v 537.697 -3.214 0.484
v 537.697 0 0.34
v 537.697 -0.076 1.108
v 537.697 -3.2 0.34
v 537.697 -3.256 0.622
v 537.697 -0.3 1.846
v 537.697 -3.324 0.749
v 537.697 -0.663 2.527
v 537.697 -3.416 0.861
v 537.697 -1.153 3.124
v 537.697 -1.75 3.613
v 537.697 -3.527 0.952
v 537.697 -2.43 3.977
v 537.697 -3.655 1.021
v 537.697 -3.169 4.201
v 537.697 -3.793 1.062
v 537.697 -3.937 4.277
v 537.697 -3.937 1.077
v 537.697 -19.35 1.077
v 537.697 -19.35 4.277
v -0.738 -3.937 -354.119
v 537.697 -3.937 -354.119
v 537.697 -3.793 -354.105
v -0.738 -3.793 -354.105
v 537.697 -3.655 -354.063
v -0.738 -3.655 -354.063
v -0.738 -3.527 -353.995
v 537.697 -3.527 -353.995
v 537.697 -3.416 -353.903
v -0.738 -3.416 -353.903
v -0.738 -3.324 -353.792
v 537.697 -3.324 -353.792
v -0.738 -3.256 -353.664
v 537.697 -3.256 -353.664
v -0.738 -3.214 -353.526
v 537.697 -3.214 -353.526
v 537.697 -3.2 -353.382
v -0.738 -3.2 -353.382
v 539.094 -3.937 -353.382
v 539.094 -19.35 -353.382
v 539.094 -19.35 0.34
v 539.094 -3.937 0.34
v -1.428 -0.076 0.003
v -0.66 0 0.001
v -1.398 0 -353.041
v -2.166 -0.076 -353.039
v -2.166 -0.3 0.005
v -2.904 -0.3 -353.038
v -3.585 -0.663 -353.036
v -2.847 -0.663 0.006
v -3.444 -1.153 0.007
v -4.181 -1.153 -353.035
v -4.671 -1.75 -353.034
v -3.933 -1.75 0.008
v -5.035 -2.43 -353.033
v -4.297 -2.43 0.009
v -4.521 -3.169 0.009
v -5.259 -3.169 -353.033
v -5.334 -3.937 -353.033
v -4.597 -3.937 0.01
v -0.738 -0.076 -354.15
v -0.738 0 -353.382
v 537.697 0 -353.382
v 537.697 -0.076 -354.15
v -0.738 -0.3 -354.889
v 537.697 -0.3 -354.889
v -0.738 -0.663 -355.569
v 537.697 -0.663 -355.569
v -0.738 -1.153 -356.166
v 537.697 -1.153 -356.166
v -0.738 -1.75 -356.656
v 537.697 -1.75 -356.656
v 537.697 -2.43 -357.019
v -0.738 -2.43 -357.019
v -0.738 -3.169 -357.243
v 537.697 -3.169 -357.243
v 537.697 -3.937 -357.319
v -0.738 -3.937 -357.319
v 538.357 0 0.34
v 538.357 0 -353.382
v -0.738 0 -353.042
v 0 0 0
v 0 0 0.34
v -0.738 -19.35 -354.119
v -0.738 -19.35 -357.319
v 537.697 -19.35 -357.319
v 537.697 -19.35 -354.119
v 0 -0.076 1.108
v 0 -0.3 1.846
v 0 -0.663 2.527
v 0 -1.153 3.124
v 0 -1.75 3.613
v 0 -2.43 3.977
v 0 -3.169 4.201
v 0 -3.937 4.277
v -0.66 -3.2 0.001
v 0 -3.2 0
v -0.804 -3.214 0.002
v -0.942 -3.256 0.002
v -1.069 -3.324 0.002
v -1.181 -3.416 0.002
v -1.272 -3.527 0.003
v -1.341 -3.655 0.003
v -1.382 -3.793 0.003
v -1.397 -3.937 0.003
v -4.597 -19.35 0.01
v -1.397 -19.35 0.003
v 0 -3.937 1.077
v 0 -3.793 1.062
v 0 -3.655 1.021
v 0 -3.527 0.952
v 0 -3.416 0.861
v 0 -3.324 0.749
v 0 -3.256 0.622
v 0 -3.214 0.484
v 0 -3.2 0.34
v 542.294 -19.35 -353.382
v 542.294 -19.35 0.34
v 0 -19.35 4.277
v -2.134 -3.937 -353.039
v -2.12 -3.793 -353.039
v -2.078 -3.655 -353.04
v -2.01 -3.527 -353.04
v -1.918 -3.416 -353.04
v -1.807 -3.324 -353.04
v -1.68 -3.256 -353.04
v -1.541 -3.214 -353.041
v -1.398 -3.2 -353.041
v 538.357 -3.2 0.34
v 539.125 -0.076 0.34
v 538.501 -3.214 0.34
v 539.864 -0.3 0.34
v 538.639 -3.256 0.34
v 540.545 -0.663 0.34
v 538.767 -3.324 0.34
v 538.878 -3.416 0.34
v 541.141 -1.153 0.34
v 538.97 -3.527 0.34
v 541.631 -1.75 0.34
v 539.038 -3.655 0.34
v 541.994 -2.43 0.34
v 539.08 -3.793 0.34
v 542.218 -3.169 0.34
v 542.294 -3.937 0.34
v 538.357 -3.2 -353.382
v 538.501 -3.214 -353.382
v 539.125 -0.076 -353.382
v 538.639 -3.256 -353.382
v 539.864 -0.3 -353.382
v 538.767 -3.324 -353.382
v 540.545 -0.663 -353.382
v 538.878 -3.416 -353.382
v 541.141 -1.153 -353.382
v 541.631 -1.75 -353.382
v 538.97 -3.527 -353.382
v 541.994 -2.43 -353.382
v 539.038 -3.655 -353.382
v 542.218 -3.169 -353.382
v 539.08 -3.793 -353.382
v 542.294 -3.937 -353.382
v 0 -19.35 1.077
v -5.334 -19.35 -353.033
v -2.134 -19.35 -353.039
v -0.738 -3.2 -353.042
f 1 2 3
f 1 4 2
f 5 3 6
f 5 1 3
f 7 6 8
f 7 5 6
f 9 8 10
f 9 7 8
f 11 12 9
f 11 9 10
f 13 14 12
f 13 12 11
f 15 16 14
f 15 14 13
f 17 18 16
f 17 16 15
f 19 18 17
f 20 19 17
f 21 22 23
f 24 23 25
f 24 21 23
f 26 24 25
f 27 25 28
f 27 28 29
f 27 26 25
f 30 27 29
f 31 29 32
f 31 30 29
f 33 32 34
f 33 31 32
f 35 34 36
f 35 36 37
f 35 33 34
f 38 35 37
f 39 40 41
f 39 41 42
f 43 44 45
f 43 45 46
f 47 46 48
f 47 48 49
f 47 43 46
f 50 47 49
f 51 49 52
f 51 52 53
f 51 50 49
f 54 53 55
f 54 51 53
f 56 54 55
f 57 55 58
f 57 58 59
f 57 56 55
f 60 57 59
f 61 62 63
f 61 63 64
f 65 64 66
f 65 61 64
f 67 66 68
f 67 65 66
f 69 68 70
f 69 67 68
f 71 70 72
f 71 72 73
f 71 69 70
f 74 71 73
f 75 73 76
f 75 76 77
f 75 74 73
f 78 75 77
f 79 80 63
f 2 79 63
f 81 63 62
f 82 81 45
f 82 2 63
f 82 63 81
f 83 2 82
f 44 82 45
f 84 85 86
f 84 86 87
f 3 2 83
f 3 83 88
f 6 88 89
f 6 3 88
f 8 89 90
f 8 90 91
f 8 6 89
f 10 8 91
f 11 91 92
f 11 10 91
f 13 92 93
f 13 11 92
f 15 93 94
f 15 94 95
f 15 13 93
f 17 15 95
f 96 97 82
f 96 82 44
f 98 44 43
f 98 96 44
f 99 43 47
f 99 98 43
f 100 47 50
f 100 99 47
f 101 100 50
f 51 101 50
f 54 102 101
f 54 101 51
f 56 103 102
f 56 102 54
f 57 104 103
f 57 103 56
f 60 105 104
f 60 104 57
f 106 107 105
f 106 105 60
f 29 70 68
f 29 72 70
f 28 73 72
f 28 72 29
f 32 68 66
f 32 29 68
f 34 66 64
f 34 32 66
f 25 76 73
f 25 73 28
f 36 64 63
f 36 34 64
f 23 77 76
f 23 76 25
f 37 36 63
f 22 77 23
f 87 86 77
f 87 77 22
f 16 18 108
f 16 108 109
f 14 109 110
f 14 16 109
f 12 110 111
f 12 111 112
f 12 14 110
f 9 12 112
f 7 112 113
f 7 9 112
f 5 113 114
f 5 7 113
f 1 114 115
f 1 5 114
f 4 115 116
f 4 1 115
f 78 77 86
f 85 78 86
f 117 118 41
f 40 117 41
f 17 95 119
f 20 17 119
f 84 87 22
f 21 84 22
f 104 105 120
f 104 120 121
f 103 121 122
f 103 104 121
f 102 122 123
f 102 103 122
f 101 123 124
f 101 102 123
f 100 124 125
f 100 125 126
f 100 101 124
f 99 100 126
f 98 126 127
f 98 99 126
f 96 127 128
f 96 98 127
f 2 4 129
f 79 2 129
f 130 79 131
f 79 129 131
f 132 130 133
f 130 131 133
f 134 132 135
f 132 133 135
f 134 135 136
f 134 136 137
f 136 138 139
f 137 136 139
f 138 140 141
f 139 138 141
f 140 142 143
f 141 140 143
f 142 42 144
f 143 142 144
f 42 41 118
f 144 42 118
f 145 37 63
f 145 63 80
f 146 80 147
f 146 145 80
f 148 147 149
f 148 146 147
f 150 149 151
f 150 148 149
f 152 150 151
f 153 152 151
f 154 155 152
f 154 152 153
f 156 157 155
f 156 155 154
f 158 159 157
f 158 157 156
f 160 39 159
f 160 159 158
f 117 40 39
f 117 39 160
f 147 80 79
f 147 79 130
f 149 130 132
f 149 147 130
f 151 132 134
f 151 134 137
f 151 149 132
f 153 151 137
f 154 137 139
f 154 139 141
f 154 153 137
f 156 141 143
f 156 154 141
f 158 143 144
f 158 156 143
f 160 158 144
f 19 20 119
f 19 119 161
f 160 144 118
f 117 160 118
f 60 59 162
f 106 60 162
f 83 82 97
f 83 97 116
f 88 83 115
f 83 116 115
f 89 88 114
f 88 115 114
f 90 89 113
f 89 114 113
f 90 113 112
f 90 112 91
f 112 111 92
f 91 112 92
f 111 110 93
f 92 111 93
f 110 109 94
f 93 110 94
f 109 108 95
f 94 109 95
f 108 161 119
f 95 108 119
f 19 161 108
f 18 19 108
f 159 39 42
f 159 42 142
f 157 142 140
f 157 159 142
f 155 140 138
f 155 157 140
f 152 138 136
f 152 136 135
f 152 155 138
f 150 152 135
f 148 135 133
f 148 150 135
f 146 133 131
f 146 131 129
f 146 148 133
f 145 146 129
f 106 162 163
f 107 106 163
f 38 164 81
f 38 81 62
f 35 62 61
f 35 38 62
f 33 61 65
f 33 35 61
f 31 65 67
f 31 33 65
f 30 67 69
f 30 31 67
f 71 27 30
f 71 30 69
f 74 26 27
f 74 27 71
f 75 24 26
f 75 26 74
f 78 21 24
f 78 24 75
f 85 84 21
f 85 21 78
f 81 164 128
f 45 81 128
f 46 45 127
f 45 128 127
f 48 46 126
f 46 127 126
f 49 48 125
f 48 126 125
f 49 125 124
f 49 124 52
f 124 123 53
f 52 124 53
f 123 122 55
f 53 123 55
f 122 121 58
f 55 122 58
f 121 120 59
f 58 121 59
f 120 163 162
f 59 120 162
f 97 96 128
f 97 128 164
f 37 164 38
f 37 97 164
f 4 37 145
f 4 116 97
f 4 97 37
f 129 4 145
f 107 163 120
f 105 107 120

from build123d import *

# Parameters (mm, degrees)
BASE_FLANGE1_DEPTH       = 3.2
EDGE_FLANGE17_DEPTH      = 538.435133562
EDGE_FLANGE17_BEND_DEPTH = 537.697496226
EDGE_FLANGE18_DEPTH      = 353.722345428
EDGE_FLANGE18_BEND_DEPTH = 353.043116027


# Sheet-metal steps are written as plain solids
with BuildPart() as part:
    # Sketch1 → Base-Flange1 (new body)
    with BuildSketch(Plane(origin=(0, 0, 0), x_dir=(1, 0, 0), z_dir=(0, 1, 0))):
        Polygon((537.697496226, 353.042345428), (0, 353.042345428), (-0.737637336, 353.042345428), (0, 0), (537.697496226, 0), align=None)
    extrude(amount=-BASE_FLANGE1_DEPTH)

    # Edge-Flange17 section (across the edge) → Edge-Flange17 (add)
    with BuildSketch(Plane(origin=(-0.737637336, -3.2, -354.118945428), x_dir=(0, 0, 1), z_dir=(1, 0, 0))):
        with BuildLine():
            Line((-3.2, 0.7366), (-3.2, 16.15))
            Line((-3.2, 16.15), (0, 16.15))
            Line((0, 16.15), (0, 0.7366))
            ThreePointArc((0, 0.7366), (0.215745145, 0.215745145), (0.7366, 0))
            Line((0.7366, 0), (1.0766, 0))
            Line((1.0766, 0), (1.0766, -3.2))
            Line((1.0766, -3.2), (0.7366, -3.2))
            ThreePointArc((0.7366, -3.2), (-2.046996555, -2.046996555), (-3.2, 0.7366))
        make_face()
    extrude(amount=EDGE_FLANGE17_DEPTH)

    # Edge-Flange17 section 2 (across the edge) → Edge-Flange17 bend (add)
    with BuildSketch(Plane(origin=(537.697496226, -3.2, 1.0766), x_dir=(0, 0, -1), z_dir=(-1, 0, 0))):
        with BuildLine():
            Line((-3.2, 0.7366), (-3.2, 16.15))
            Line((-3.2, 16.15), (0, 16.15))
            Line((0, 16.15), (0, 0.7366))
            ThreePointArc((0, 0.7366), (0.215745145, 0.215745145), (0.7366, 0))
            Line((0.7366, 0), (1.0766, 0))
            Line((1.0766, 0), (1.0766, -3.2))
            Line((1.0766, -3.2), (0.7366, -3.2))
            ThreePointArc((0.7366, -3.2), (-2.046996555, -2.046996555), (-3.2, 0.7366))
        make_face()
    extrude(amount=EDGE_FLANGE17_BEND_DEPTH)

    # Edge-Flange18 section (across the edge) → Edge-Flange18 (add)
    with BuildSketch(Plane(origin=(539.094096226, -3.2, -353.382345428), x_dir=(-1, 0, 0), z_dir=(0, 0, 1))):
        with BuildLine():
            Line((-3.2, 0.7366), (-3.2, 16.15))
            Line((-3.2, 16.15), (0, 16.15))
            Line((0, 16.15), (0, 0.7366))
            ThreePointArc((0, 0.7366), (0.215745145, 0.215745145), (0.7366, 0))
            Line((0.7366, 0), (1.3966, 0))
            Line((1.3966, 0), (1.3966, -3.2))
            Line((1.3966, -3.2), (0.7366, -3.2))
            ThreePointArc((0.7366, -3.2), (-2.046996555, -2.046996555), (-3.2, 0.7366))
        make_face()
    extrude(amount=EDGE_FLANGE18_DEPTH)

    # Edge-Flange18 section 2 (across the edge) → Edge-Flange18 bend (add)
    with BuildSketch(Plane(origin=(-1.396596952, -3.2, 0.002918013), x_dir=(0.999997817266246, -3.4914813388431337e-15, -0.0020893689821821237), z_dir=(-0.0020893689821821237, 0, -0.999997817266246))):
        with BuildLine():
            Line((-3.2, 0.7366), (-3.2, 16.15))
            Line((-3.2, 16.15), (0, 16.15))
            Line((0, 16.15), (0, 0.7366))
            ThreePointArc((0, 0.7366), (0.215745145, 0.215745145), (0.7366, 0))
            Line((0.7366, 0), (1.3966, 0))
            Line((1.3966, 0), (1.3966, -3.2))
            Line((1.3966, -3.2), (0.7366, -3.2))
            ThreePointArc((0.7366, -3.2), (-2.046996555, -2.046996555), (-3.2, 0.7366))
        make_face()
    extrude(amount=EDGE_FLANGE18_BEND_DEPTH)


solid = part.part
